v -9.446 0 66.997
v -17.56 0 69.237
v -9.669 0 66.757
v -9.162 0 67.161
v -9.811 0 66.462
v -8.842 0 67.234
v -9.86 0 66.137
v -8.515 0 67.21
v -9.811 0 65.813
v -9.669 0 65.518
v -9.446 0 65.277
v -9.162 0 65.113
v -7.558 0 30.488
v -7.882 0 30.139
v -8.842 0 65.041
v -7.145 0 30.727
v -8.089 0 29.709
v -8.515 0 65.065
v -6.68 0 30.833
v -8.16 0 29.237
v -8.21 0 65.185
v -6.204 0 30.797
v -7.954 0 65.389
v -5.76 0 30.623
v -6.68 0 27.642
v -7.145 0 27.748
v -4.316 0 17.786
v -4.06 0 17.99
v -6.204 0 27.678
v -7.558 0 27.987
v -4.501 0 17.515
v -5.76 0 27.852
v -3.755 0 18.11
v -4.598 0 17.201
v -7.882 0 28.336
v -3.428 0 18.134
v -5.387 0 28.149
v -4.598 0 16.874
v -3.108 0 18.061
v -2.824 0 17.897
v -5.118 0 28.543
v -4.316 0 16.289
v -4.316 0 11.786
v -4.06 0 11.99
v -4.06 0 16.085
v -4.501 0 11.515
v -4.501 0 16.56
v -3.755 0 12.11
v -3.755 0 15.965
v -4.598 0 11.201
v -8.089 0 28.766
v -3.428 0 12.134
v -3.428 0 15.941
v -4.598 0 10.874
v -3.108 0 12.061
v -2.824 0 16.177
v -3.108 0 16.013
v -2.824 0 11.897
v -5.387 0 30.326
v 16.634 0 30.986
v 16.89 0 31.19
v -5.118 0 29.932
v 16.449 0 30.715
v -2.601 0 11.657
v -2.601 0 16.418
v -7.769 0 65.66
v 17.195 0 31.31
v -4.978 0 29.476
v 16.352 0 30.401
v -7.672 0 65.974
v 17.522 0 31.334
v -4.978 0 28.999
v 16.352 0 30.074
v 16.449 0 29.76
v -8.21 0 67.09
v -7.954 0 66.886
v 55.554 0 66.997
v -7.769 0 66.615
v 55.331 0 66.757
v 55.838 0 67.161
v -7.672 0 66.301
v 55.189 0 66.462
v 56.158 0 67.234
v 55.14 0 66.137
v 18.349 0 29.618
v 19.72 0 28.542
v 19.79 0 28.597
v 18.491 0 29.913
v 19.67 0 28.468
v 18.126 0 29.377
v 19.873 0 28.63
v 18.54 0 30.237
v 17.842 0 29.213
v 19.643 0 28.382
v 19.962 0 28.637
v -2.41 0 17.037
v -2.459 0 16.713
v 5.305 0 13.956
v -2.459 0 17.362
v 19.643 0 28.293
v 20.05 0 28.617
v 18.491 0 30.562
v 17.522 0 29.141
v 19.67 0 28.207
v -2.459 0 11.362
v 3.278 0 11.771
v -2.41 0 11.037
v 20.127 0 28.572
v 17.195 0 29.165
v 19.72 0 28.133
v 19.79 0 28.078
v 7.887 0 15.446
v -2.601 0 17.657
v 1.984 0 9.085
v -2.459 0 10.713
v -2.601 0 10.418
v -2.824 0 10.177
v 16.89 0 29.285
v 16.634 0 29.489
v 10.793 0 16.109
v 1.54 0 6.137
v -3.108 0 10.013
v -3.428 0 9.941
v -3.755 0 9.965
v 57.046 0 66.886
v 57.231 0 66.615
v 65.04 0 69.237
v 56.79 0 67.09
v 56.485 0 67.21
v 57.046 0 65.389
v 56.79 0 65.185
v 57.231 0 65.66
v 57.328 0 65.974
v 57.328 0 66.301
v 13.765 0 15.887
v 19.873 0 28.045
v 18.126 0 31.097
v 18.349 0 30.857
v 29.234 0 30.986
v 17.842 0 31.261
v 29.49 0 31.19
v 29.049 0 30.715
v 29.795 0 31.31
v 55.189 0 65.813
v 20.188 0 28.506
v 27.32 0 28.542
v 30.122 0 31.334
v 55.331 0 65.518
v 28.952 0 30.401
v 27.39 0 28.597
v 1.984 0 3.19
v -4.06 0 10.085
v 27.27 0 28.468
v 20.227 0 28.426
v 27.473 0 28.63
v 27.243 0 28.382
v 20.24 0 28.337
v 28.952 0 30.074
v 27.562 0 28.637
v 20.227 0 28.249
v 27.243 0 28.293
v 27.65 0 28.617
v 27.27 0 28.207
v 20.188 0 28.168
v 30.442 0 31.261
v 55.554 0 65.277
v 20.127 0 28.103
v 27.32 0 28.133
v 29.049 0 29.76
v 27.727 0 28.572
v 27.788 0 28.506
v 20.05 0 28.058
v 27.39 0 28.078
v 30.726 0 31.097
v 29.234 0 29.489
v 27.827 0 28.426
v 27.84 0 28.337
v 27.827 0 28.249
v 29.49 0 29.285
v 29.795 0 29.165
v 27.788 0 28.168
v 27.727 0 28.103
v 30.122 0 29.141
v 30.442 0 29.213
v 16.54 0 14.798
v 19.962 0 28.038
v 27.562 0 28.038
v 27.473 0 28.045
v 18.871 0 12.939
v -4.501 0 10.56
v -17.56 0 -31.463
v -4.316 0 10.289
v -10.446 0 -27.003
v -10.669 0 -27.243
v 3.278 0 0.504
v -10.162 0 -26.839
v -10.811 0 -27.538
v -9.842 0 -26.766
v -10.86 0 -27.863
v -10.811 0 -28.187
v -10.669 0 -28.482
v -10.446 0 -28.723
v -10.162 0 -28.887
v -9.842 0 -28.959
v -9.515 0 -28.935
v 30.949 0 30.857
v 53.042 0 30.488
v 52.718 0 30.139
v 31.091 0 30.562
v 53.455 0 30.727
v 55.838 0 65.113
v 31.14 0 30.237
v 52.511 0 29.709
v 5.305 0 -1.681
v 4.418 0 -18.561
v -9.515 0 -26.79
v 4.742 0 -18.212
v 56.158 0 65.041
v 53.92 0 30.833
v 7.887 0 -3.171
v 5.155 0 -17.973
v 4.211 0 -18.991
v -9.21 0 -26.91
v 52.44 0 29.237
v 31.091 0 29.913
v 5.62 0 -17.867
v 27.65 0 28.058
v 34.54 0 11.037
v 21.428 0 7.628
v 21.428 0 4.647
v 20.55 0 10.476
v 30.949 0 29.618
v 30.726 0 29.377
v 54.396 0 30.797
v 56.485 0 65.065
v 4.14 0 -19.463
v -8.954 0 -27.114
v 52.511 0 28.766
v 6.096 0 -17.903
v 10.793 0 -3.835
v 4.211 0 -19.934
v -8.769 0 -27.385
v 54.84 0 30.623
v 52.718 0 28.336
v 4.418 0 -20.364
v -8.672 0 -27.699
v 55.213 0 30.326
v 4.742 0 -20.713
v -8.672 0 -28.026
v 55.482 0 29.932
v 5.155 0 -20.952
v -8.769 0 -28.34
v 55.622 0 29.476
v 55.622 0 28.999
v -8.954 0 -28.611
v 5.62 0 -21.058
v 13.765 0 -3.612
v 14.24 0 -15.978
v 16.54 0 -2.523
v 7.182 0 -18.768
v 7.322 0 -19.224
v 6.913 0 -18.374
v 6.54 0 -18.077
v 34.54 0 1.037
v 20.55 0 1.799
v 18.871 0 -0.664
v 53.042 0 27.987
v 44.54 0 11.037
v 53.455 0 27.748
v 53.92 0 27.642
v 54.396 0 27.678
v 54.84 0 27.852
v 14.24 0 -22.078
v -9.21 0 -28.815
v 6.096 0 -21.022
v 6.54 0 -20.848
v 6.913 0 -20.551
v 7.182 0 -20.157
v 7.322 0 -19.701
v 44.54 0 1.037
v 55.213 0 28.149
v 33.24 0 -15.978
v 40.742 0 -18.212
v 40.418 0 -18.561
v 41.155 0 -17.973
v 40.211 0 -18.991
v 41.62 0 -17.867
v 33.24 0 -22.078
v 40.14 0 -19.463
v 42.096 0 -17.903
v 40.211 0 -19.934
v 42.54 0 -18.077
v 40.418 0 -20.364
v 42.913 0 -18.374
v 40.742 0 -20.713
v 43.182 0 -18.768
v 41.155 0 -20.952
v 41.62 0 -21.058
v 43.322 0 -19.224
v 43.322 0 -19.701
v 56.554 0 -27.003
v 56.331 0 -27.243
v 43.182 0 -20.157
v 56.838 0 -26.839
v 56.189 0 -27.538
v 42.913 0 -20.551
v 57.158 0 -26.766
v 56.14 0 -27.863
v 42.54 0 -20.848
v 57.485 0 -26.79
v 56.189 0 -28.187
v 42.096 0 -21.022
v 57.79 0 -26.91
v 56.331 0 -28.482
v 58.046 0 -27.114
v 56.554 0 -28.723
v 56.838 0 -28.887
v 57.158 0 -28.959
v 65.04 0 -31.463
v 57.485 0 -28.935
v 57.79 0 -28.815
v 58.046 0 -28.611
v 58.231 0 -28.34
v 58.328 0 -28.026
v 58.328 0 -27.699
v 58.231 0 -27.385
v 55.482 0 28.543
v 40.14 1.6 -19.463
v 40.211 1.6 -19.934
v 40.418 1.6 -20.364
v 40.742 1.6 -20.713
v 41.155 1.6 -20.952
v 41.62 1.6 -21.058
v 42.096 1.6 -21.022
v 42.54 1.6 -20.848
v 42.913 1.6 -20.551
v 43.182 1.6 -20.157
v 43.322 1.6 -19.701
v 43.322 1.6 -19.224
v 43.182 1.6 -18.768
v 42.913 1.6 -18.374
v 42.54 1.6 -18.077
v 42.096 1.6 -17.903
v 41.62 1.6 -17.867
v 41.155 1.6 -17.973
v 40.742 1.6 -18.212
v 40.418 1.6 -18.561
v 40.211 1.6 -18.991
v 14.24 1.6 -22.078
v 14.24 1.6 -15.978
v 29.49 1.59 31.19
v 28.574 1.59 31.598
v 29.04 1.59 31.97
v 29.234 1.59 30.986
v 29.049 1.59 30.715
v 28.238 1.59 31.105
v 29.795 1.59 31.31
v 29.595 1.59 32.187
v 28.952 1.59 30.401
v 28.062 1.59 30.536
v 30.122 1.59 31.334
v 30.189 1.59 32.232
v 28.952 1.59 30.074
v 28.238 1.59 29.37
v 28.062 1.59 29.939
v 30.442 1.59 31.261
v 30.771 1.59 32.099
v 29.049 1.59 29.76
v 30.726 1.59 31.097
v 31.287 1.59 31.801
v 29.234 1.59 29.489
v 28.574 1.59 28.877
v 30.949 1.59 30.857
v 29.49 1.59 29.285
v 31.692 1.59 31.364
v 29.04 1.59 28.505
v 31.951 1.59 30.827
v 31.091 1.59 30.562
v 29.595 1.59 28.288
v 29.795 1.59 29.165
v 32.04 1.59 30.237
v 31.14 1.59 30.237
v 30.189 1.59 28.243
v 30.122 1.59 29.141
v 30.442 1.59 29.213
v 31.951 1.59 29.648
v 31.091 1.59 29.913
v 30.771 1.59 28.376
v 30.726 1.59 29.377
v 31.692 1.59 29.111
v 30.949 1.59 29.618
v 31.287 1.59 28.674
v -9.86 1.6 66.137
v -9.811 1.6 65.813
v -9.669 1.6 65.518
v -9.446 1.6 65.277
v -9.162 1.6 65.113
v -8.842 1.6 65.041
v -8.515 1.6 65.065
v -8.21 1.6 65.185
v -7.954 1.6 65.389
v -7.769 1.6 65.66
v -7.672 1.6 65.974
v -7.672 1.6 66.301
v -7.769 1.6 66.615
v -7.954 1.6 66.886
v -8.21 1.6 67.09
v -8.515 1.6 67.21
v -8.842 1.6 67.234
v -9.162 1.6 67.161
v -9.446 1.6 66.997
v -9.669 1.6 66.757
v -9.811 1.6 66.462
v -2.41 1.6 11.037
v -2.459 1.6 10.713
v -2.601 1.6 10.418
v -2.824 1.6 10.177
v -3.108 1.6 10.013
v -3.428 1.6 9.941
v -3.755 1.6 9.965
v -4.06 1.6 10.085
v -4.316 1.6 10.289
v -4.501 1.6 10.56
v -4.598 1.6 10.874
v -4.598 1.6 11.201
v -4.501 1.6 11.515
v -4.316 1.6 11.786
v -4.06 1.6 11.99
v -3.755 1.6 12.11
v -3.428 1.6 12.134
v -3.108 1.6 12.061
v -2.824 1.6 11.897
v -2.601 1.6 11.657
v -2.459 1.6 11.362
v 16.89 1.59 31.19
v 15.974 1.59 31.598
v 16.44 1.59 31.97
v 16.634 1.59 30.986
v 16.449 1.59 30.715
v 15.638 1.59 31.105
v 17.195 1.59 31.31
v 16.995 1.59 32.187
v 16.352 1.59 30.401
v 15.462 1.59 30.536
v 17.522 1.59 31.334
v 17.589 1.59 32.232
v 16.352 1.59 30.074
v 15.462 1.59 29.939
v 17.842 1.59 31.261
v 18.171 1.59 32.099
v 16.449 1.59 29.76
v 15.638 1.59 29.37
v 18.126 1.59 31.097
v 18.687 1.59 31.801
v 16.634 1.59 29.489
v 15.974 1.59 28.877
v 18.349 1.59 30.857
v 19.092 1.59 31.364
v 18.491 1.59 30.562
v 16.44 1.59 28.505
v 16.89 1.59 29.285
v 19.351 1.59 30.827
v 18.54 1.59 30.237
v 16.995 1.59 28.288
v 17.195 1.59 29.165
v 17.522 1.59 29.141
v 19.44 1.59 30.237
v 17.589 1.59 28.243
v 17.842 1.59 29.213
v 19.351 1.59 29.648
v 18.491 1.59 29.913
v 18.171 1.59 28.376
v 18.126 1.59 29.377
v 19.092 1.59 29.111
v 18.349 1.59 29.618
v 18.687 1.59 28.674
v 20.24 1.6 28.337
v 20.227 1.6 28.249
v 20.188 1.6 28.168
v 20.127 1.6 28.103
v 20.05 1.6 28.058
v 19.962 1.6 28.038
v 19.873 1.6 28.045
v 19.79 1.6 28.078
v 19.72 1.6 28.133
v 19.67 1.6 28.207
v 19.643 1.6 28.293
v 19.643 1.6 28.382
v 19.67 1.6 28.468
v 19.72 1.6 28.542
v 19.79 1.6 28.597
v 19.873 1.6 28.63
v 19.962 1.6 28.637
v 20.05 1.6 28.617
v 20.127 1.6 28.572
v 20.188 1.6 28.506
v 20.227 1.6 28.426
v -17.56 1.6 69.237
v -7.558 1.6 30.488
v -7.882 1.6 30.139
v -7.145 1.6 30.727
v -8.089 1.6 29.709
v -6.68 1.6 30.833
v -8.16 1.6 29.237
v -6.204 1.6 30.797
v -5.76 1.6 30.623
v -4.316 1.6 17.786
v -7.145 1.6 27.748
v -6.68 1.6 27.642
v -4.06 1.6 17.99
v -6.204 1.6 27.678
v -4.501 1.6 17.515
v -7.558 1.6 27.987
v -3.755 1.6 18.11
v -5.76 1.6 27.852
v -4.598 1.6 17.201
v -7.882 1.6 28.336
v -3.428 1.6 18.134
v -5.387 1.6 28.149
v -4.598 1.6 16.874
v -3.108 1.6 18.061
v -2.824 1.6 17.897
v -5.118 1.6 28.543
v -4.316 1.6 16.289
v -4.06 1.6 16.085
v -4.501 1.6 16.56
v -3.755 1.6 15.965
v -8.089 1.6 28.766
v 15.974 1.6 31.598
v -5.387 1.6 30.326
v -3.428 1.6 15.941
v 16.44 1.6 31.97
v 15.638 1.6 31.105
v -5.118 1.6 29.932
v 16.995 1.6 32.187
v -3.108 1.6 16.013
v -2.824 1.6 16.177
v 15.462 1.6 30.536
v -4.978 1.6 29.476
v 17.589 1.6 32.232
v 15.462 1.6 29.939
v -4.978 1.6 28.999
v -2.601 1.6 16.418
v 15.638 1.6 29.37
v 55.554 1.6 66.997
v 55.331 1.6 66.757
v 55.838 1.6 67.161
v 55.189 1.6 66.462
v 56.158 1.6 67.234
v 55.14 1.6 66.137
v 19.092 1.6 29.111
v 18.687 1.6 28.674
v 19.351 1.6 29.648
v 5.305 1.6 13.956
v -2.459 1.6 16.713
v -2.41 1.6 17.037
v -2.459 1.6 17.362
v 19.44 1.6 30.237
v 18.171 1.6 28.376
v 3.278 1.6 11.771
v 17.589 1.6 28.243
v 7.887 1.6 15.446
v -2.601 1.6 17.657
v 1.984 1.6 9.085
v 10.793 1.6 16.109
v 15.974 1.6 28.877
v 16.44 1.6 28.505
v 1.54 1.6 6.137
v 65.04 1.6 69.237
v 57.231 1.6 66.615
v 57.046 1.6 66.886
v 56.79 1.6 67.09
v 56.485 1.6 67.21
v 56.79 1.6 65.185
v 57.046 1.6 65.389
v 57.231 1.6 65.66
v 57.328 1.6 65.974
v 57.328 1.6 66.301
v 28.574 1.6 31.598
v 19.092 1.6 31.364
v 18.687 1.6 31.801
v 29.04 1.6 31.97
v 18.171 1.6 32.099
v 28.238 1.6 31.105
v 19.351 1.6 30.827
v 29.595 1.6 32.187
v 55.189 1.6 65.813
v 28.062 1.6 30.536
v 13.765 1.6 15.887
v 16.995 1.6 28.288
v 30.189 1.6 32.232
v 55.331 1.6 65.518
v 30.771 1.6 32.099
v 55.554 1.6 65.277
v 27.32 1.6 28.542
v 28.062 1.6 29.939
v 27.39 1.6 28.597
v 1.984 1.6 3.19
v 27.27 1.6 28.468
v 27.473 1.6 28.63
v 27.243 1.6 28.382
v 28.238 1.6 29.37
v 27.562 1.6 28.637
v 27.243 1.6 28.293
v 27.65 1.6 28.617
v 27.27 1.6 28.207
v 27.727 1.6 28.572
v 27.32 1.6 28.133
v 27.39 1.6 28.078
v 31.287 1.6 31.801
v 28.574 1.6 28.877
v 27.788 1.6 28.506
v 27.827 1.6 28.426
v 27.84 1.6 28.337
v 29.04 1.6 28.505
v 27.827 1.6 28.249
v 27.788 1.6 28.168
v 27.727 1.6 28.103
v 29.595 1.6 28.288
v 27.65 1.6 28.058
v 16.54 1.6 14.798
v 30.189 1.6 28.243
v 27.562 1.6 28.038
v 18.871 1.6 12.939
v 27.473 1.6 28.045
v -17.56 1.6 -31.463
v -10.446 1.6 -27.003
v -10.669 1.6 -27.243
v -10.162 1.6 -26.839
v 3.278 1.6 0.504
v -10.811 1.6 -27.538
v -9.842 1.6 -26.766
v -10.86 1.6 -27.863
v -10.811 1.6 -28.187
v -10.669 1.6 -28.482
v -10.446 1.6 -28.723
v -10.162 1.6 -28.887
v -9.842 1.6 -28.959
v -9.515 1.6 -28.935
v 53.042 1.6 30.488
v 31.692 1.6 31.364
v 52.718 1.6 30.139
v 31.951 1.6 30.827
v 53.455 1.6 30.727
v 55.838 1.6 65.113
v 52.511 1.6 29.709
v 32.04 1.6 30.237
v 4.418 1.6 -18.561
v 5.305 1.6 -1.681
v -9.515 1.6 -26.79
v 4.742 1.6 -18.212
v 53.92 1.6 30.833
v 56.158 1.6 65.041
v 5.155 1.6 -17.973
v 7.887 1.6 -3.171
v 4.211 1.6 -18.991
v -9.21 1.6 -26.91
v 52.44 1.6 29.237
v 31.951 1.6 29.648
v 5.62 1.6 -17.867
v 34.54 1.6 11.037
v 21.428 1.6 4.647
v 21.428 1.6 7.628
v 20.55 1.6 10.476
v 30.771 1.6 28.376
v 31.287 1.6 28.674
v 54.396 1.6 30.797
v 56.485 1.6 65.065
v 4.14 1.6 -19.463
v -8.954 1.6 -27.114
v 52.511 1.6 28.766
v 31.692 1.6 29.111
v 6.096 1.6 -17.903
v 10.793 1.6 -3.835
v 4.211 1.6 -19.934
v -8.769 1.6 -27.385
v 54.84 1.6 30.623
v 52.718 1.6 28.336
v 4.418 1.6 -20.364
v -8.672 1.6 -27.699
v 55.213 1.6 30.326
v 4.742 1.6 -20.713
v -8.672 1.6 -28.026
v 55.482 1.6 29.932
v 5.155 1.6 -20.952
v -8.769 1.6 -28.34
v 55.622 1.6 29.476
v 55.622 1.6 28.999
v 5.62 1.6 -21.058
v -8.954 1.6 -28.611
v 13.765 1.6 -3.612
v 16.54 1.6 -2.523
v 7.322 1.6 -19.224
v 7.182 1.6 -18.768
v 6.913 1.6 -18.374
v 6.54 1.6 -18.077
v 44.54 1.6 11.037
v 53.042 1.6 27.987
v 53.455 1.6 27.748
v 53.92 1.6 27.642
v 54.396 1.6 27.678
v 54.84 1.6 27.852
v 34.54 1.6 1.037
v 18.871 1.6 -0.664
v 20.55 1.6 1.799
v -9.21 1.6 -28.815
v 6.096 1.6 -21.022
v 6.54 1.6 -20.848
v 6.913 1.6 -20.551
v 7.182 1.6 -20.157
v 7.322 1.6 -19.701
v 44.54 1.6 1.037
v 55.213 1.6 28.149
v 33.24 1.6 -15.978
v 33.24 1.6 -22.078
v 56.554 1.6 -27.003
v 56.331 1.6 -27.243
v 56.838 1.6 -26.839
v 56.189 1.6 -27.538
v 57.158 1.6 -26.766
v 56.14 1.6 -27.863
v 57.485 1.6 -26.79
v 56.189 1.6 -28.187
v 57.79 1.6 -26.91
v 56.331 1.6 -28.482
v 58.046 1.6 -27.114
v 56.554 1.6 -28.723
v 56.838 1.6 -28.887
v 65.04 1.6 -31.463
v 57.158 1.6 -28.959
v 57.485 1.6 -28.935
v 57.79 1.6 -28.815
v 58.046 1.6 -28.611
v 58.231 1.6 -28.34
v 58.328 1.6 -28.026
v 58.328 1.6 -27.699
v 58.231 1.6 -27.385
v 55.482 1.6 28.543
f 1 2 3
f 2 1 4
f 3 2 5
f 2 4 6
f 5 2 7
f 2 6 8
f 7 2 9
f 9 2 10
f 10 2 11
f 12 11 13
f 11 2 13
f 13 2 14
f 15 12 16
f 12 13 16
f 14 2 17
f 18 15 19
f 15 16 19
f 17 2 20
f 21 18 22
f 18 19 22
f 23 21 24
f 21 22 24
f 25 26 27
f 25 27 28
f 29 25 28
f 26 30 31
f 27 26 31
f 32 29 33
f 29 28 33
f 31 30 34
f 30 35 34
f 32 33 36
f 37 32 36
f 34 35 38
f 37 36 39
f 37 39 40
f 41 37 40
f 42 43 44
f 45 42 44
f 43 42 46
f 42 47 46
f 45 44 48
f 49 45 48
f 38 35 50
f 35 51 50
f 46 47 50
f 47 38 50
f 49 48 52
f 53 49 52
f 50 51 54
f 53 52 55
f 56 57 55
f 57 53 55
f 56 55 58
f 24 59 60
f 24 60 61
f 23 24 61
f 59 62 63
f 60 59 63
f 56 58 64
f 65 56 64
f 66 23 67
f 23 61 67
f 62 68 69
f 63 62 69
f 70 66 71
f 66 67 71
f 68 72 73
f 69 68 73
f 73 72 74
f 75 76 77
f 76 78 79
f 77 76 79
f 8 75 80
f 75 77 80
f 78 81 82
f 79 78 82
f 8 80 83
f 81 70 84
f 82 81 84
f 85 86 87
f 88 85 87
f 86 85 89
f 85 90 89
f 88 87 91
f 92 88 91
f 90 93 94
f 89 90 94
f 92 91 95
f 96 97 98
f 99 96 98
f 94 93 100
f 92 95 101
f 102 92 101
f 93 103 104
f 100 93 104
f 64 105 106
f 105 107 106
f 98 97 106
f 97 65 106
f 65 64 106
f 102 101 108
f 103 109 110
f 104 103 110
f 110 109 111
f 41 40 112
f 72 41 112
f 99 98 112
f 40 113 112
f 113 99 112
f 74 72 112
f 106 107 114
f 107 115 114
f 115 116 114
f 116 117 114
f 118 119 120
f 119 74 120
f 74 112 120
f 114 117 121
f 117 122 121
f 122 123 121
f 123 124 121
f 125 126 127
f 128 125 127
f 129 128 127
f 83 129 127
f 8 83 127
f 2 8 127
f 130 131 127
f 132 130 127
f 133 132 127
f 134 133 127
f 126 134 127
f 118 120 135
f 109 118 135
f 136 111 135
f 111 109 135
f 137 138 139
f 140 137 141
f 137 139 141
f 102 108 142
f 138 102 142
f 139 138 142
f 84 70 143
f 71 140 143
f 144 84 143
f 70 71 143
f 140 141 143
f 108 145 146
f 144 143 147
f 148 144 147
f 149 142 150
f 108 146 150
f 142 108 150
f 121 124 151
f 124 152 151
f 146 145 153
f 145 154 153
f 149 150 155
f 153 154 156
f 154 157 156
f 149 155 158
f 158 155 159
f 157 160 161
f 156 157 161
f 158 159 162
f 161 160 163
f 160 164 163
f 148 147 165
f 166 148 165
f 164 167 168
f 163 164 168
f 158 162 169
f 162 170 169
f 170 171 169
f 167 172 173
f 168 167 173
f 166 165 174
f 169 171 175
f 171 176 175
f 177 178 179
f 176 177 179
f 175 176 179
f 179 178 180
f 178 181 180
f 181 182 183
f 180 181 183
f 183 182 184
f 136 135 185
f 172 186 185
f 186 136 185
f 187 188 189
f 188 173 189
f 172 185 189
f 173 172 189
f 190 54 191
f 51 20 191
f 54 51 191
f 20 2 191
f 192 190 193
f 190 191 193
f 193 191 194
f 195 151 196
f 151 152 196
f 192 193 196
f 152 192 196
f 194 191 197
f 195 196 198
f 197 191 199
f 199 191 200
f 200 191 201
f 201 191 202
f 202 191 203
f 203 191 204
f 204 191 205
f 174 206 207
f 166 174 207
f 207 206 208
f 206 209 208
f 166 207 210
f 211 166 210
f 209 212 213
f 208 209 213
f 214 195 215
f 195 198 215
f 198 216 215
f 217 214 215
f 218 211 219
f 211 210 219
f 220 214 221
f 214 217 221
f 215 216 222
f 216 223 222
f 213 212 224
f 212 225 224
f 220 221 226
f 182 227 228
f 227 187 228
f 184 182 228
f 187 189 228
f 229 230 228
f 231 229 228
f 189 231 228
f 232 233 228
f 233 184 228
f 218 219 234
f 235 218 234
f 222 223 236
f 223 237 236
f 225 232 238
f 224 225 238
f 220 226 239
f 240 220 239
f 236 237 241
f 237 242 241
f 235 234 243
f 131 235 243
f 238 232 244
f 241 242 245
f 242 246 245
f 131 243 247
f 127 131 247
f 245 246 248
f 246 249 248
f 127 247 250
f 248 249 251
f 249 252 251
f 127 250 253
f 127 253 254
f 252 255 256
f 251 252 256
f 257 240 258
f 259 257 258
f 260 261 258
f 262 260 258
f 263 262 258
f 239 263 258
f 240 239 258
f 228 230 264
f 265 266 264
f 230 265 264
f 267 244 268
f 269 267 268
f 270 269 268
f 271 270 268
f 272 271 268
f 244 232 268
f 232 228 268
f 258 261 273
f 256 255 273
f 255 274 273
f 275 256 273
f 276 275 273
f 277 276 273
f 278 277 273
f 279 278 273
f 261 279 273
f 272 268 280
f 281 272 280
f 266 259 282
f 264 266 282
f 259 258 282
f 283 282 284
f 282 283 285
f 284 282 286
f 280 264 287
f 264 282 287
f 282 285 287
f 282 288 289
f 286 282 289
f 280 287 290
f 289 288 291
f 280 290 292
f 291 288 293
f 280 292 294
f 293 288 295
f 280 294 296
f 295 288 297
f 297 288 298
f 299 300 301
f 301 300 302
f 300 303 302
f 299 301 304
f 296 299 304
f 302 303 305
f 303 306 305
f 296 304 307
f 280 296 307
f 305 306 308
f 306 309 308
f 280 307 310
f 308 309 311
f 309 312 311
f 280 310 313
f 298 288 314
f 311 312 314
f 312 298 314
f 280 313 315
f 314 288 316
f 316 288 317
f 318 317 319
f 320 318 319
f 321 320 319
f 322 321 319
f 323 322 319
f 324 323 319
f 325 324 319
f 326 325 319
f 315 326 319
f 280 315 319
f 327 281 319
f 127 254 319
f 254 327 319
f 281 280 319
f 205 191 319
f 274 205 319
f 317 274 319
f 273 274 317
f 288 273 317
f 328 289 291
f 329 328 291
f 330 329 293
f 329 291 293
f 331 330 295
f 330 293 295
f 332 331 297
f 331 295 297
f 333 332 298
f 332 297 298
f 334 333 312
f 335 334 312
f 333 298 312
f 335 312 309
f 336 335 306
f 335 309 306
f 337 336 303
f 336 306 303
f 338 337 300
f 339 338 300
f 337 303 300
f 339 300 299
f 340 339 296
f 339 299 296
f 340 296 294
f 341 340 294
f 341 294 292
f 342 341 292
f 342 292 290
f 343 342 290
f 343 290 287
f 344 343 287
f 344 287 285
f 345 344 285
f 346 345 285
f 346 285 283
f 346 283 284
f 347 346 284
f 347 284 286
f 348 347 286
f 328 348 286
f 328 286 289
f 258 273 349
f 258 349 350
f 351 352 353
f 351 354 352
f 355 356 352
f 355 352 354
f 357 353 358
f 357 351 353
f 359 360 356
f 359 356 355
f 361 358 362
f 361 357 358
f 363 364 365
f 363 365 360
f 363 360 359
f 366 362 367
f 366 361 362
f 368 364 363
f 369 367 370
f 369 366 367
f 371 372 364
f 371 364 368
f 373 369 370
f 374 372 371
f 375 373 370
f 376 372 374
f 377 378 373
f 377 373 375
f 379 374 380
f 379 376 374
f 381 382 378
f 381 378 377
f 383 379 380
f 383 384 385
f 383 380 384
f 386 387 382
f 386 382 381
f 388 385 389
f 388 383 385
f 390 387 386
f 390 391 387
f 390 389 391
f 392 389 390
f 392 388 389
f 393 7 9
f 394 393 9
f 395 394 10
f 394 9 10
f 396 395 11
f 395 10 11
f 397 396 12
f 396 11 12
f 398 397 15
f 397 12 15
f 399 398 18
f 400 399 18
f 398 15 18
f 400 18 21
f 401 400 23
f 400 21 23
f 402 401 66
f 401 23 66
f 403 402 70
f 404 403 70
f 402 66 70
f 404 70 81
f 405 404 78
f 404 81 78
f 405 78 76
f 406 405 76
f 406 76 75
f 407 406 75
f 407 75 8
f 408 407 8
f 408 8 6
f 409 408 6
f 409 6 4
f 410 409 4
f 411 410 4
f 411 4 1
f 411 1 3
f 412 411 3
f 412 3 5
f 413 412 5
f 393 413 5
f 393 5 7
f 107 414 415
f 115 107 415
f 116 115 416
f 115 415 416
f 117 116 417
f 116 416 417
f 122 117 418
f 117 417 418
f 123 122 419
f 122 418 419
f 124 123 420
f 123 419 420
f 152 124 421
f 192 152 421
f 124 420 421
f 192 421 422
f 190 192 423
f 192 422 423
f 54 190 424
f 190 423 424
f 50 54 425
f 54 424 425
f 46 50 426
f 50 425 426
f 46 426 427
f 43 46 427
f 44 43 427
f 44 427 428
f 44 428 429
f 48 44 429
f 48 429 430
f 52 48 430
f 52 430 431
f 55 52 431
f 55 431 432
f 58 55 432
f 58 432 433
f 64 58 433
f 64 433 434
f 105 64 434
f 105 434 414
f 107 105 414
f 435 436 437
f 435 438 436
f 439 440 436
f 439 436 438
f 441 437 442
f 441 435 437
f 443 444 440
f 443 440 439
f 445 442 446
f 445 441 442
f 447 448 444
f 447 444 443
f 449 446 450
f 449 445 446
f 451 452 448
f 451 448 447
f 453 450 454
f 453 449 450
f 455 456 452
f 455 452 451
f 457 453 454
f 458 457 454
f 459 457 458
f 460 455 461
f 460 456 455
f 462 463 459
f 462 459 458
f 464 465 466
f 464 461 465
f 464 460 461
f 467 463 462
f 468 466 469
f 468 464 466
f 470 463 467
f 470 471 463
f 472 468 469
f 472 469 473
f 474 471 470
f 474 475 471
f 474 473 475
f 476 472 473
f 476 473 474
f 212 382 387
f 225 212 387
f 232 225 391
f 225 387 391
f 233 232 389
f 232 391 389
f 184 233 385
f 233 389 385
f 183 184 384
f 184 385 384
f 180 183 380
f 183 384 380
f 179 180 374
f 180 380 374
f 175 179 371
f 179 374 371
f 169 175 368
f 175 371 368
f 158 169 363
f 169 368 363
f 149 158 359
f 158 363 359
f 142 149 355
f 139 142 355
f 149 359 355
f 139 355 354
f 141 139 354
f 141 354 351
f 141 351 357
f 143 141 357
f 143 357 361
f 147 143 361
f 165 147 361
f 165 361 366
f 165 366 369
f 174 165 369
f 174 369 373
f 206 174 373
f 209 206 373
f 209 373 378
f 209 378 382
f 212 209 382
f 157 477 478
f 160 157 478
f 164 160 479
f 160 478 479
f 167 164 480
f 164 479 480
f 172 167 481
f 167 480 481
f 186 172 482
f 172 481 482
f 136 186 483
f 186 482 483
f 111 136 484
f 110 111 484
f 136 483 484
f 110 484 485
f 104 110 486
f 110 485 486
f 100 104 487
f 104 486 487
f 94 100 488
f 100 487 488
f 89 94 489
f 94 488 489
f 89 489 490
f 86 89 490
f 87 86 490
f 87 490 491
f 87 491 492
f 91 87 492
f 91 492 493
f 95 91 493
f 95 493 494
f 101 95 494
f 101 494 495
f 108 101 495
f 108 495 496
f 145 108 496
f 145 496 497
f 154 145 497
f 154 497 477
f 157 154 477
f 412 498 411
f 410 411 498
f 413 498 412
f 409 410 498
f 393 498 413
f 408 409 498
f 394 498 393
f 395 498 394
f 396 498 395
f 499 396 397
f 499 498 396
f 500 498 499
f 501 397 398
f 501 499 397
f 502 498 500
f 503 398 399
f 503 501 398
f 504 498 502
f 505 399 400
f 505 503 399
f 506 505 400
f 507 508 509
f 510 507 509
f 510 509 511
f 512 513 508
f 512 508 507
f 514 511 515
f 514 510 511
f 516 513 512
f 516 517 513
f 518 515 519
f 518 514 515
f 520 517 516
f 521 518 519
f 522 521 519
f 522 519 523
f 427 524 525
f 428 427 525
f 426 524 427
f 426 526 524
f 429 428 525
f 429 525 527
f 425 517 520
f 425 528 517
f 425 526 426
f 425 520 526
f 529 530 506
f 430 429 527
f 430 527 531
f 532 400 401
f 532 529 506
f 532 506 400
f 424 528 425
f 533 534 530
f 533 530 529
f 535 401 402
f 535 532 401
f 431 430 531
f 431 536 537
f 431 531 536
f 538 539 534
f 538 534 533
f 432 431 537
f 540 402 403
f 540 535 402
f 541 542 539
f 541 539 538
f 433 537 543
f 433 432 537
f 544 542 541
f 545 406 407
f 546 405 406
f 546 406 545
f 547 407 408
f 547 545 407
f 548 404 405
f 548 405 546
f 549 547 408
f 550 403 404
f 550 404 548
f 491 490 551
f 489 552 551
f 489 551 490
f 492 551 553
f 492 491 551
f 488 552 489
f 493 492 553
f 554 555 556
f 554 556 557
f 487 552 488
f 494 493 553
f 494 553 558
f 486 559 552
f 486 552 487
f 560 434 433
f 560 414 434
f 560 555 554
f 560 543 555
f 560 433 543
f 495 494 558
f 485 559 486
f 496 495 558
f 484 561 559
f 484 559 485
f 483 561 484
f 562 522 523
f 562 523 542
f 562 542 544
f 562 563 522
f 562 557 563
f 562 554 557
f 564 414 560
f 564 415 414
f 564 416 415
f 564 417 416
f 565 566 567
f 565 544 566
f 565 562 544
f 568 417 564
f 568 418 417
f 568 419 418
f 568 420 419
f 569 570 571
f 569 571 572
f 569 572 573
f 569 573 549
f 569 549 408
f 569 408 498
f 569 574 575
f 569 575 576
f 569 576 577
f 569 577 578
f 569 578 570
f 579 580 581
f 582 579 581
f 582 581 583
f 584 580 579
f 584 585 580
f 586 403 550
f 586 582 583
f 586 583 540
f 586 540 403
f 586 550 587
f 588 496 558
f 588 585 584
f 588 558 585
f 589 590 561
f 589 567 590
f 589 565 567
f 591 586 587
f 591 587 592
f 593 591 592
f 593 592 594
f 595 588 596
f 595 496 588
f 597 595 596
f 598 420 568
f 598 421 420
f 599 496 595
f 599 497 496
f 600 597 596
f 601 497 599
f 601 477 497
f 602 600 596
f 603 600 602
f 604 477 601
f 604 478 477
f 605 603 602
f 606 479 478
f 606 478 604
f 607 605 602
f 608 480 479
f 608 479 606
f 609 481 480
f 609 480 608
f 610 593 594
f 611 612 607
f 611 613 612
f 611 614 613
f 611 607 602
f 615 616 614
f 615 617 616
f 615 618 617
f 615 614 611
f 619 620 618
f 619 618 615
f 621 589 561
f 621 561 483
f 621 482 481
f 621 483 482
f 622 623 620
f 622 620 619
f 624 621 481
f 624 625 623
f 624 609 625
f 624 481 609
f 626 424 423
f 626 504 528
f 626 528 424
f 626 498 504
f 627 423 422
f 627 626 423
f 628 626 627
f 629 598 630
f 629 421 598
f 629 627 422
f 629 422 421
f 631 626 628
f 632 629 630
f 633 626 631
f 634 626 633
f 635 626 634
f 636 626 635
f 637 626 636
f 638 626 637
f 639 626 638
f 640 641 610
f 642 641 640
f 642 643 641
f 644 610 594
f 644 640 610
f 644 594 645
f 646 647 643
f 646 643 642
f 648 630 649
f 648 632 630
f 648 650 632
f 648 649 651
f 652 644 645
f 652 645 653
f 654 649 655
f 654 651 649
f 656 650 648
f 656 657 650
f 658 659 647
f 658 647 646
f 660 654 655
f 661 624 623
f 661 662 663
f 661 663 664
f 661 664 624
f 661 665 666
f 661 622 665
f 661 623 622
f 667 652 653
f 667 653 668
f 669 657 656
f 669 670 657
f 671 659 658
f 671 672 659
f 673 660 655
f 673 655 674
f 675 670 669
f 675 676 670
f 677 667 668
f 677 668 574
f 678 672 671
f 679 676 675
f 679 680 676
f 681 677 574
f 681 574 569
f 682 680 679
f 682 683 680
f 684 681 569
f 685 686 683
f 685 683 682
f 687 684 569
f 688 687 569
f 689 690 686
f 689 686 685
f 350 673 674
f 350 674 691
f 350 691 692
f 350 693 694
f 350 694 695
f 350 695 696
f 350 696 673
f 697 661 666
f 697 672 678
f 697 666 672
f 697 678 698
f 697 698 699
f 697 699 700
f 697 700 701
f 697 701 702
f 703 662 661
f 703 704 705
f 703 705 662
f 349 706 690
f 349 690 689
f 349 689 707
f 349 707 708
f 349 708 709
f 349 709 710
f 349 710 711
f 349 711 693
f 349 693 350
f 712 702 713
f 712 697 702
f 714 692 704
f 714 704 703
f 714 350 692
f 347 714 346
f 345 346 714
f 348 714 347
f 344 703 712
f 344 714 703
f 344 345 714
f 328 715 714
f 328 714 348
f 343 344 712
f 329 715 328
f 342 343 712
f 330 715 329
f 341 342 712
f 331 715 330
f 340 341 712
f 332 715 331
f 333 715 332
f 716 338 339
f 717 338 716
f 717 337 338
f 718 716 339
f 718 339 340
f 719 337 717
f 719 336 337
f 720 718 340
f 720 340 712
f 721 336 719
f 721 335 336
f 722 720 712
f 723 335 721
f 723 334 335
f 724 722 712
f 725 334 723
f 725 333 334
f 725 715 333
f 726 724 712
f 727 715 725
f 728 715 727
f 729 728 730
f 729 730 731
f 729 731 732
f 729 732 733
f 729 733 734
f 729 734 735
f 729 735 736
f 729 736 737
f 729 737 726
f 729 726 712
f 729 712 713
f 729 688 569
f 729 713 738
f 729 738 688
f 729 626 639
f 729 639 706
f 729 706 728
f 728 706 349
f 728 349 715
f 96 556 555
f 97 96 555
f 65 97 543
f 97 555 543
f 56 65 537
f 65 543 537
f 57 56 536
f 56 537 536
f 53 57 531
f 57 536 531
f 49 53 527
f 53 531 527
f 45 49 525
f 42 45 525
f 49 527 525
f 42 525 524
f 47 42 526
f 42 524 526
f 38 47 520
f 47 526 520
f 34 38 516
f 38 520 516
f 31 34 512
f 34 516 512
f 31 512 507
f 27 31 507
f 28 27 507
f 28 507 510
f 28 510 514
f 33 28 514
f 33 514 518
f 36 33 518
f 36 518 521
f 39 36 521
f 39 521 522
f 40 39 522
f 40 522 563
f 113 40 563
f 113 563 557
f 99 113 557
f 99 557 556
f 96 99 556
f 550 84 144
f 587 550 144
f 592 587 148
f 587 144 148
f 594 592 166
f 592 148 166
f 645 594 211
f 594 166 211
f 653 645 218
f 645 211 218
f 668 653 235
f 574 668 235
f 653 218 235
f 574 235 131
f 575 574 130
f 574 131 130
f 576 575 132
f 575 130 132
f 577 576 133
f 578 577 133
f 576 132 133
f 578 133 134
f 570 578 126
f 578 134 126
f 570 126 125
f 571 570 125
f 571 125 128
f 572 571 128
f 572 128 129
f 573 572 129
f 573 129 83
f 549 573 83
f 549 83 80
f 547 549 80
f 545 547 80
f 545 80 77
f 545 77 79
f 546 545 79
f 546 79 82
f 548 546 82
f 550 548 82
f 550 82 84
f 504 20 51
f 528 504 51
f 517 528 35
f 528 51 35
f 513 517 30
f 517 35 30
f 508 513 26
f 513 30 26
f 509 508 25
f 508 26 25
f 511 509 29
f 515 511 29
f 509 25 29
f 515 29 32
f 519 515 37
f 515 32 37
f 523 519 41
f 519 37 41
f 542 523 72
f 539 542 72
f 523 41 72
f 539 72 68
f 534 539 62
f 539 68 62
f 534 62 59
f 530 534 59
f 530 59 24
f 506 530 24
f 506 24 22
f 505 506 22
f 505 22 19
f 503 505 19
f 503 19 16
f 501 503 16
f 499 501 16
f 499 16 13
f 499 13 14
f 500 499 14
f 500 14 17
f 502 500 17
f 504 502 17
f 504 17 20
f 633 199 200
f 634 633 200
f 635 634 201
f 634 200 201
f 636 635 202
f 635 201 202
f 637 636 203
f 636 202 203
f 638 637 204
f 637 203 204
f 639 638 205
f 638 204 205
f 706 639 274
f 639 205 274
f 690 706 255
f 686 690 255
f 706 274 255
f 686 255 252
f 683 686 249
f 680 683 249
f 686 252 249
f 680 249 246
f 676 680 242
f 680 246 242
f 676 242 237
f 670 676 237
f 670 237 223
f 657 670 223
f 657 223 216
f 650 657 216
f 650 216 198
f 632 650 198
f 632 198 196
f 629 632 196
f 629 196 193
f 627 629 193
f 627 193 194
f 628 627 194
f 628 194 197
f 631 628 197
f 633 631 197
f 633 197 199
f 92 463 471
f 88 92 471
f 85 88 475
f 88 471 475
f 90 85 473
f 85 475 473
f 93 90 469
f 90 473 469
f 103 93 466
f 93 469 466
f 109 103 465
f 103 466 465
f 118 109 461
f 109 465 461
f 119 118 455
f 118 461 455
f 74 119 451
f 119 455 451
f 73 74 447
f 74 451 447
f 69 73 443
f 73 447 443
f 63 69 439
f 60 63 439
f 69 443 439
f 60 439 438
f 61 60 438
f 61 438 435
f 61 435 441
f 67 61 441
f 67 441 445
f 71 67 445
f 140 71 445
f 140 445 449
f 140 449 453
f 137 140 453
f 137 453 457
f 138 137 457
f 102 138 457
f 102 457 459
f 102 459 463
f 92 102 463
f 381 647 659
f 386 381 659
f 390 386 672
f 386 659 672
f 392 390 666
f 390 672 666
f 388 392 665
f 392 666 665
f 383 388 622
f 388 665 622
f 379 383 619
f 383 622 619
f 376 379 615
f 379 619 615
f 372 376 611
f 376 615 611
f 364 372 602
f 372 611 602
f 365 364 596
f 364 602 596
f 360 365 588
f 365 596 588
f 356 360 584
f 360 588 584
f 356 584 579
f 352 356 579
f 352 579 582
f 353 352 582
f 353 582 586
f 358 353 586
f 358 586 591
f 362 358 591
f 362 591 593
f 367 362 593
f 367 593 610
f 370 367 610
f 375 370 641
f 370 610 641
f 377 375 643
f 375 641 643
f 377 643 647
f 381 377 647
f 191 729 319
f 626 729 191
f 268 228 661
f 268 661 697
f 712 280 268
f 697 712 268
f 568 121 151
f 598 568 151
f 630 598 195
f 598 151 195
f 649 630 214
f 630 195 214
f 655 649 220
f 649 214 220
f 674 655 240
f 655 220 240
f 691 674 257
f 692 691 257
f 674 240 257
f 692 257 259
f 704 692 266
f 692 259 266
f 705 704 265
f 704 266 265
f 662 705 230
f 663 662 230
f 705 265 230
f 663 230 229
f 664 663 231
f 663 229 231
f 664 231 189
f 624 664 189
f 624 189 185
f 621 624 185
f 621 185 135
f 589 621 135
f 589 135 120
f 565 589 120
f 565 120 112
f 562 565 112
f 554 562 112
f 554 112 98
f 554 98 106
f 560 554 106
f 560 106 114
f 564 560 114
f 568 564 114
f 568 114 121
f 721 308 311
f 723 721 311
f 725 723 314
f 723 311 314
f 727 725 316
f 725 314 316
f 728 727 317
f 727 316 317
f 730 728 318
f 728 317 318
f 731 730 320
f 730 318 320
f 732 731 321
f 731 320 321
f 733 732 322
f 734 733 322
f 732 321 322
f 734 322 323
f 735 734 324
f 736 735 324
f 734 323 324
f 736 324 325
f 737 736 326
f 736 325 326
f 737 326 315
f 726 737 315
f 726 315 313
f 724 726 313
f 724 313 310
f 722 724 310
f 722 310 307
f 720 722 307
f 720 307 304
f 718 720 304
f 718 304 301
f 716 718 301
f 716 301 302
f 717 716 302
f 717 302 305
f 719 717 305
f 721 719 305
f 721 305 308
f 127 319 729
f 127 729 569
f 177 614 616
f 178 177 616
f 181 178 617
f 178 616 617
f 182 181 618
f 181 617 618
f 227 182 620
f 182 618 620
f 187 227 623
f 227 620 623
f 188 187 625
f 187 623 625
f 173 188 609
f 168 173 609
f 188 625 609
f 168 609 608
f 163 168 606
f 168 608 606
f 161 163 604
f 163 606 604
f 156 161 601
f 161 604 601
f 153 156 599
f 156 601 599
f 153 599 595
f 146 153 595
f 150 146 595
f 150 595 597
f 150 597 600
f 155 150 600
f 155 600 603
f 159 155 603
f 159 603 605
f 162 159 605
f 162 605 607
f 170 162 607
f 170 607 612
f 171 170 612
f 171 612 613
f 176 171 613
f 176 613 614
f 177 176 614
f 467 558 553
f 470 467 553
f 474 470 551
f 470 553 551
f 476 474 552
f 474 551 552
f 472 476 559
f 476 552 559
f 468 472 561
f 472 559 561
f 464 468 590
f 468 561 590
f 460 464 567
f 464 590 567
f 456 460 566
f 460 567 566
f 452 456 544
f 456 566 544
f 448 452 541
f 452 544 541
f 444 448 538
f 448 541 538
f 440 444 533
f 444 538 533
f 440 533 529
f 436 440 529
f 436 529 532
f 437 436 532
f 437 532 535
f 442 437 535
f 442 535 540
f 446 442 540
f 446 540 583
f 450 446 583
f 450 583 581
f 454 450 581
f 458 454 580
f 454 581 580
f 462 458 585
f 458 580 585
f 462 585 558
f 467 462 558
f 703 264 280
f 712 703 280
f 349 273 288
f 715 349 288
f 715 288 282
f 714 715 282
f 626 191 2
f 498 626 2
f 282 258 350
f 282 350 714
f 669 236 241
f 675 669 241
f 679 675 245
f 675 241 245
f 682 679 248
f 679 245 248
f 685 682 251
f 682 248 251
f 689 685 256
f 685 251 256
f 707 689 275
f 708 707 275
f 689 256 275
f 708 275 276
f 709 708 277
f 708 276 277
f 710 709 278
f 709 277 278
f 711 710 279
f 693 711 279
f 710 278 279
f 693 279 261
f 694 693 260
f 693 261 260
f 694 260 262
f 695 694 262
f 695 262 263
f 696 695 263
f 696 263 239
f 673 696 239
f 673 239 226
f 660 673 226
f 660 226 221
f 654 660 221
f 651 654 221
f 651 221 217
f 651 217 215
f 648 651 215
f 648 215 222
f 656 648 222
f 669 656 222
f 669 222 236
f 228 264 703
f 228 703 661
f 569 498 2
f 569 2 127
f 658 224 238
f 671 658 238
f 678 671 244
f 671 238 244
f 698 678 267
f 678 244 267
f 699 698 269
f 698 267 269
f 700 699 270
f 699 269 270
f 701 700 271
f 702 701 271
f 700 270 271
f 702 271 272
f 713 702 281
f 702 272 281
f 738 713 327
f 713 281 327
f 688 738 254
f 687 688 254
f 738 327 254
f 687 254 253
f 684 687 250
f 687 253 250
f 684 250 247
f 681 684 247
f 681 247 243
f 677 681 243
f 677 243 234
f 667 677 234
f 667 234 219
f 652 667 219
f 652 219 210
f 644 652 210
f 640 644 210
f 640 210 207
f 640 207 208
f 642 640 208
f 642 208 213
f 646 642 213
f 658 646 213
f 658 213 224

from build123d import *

# Parameters (mm, degrees)
BOSS_EXTRUDE1_DEPTH            = 1.6
F_2_2_2_2_DIAMETER_HOLE1_D     = 2.2
F_2_2_2_2_DIAMETER_HOLE1_DEPTH = 5
SKETCH9_R                      = 10
CUT_EXTRUDE4_DEPTH             = 2.6
SKETCH15_W                     = 83
SKETCH15_H                     = 2.5
CUT_EXTRUDE8_DEPTH             = 2.6
SKETCH37_W                     = 83
SKETCH37_H                     = 1.6
EXTRUDE1_DEPTH                 = 1.6
SKETCH38_W                     = 83
SKETCH38_H                     = 1.6
EXTRUDE2_DEPTH                 = 1.6
F_2_2_2_2_DIAMETER_HOLE4_D     = 2.2
F_2_2_2_2_DIAMETER_HOLE4_DEPTH = 1.6
SKETCH49_W                     = 0.2
SKETCH49_H                     = 100.7
EXTRUDE5_DEPTH                 = 2.6
SKETCH51_W                     = 10
SKETCH51_H                     = 10
CUT_EXTRUDE9_DEPTH             = 10
SKETCH52_W                     = 19
SKETCH52_H                     = 6.1
CUT_EXTRUDE10_DEPTH            = 2.6
SKETCH_2_R                     = 1.6
CUT_EXTRUDE_2_DEPTH            = 10
SKETCH_8_R                     = 0.3
CUT_EXTRUDE_3_DEPTH            = 10
SKETCH_9_R                     = 1.1
CUT_EXTRUDE_4_DEPTH            = 10
SKETCH_10_R                    = 2
CUT_EXTRUDE_5_DEPTH            = 0.01
SKETCH_11_R                    = 1.1
CUT_EXTRUDE_6_DEPTH            = 10


with BuildPart() as part:
    # Sketch1 → Boss-Extrude1 (new body)
    with BuildSketch(Plane(origin=(0, 0, 0), x_dir=(1, 0, 0), z_dir=(0, 1, 0))):
        Polygon((65.24, 0.272495156), (65.24, -46.437452638), (65.24, -63.637452638), (65.24, -70.137452638), (-17.76, -70.137452638), (-17.76, -63.637452638), (-17.76, -48.637452638), (-17.76, -45.78978272), (-17.76, 4.362547362), (-17.76, 21.562547362), (-17.76, 29.862547362), (65.24, 29.862547362), (65.24, 21.562547362), (65.24, 6.562547362), align=None)
    extrude(amount=BOSS_EXTRUDE1_DEPTH)

    # Ø2.2 (2.2) Diameter Hole1
    with Locations(Plane(origin=(0, 1.6, 0), x_dir=(1, 0, 0), z_dir=(0, 1, 0))):
        with Locations((57.24, 27.862547362), (-9.76, 27.862547362)):
            Hole(F_2_2_2_2_DIAMETER_HOLE1_D / 2, depth=F_2_2_2_2_DIAMETER_HOLE1_DEPTH)

    # Sketch9 → Cut-Extrude4 (cut, through all)
    with BuildSketch(Plane(origin=(0, 0, 0), x_dir=(-1, 0, 0), z_dir=(0, -1, 0))):
        with Locations((-11.54, -6.137452638)):
            Circle(SKETCH9_R)
    extrude(amount=-CUT_EXTRUDE4_DEPTH, mode=Mode.SUBTRACT)

    # Sketch15 → Cut-Extrude8 (cut, through all)
    with BuildSketch(Plane.XZ):
        with Locations((23.74, 68.887452638)):
            Rectangle(SKETCH15_W, SKETCH15_H)
    extrude(amount=-CUT_EXTRUDE8_DEPTH, mode=Mode.SUBTRACT)

    # Sketch37 → Extrude1 (add)
    with BuildSketch(Plane(origin=(0, 0, -29.862547362), x_dir=(-1, 0, 0), z_dir=(0, 0, -1))):
        with Locations((-23.74, 0.8)):
            Rectangle(SKETCH37_W, SKETCH37_H)
    extrude(amount=EXTRUDE1_DEPTH)

    # Sketch38 → Extrude2 (add)
    with BuildSketch(Plane.XY.offset(67.637452638)):
        with Locations((23.74, 0.8)):
            Rectangle(SKETCH38_W, SKETCH38_H)
    extrude(amount=EXTRUDE2_DEPTH)

    # Ø2.2 (2.2) Diameter Hole4
    with Locations(Plane(origin=(0, 1.6, 0), x_dir=(1, 0, 0), z_dir=(0, 1, 0))):
        with Locations((-8.76, -66.137452638), (56.24, -66.137452638)):
            Hole(F_2_2_2_2_DIAMETER_HOLE4_D / 2, depth=F_2_2_2_2_DIAMETER_HOLE4_DEPTH)

    # Sketch49 → Extrude5 (cut, through all)
    with BuildSketch(Plane.XZ):
        with Locations((65.14, 18.887452638)):
            Rectangle(SKETCH49_W, SKETCH49_H)
        with Locations((-17.66, 18.887452638)):
            Rectangle(SKETCH49_W, SKETCH49_H)
    extrude(amount=-EXTRUDE5_DEPTH, mode=Mode.SUBTRACT)

    # Sketch51 → Cut-Extrude9 (cut)
    with BuildSketch(Plane.XZ):
        with Locations((39.54, 6.037452638)):
            Rectangle(SKETCH51_W, SKETCH51_H)
    extrude(amount=-CUT_EXTRUDE9_DEPTH, mode=Mode.SUBTRACT)

    # Sketch52 → Cut-Extrude10 (cut, through all)
    with BuildSketch(Plane.XZ):
        with Locations((23.74, -19.027547362)):
            Rectangle(SKETCH52_W, SKETCH52_H)
    extrude(amount=-CUT_EXTRUDE10_DEPTH, mode=Mode.SUBTRACT)

    # ｽｹｯﾁ2 → ｶｯﾄ - 押し出し2 (cut)
    with BuildSketch(Plane(origin=(0, 0, 0), x_dir=(-1, 0, 0), z_dir=(0, -1, 0))):
        with Locations((-54.04, -29.237452638)):
            Circle(SKETCH_2_R)
        with Locations((6.56, -29.237452638)):
            Circle(SKETCH_2_R)
        with Locations((-41.74, 19.462547362)):
            Circle(SKETCH_2_R)
        with Locations((-5.74, 19.462547362)):
            Circle(SKETCH_2_R)
    extrude(amount=-CUT_EXTRUDE_2_DEPTH, mode=Mode.SUBTRACT)

    # ｽｹｯﾁ8 → ｶｯﾄ - 押し出し3 (cut)
    with BuildSketch(Plane(origin=(0, 1.6, 0), x_dir=(1, 0, 0), z_dir=(0, 1, 0))):
        with Locations((27.54, -28.337452638)):
            Circle(SKETCH_8_R)
        with Locations((19.94, -28.337452638)):
            Circle(SKETCH_8_R)
    extrude(amount=-CUT_EXTRUDE_3_DEPTH, mode=Mode.SUBTRACT)

    # ｽｹｯﾁ9 → ｶｯﾄ - 押し出し4 (cut)
    with BuildSketch(Plane(origin=(0, 1.6, 0), x_dir=(1, 0, 0), z_dir=(0, 1, 0))):
        with Locations((30.04, -30.237452638)):
            Circle(SKETCH_9_R)
        with Locations((17.44, -30.237452638)):
            Circle(SKETCH_9_R)
    extrude(amount=-CUT_EXTRUDE_4_DEPTH, mode=Mode.SUBTRACT)

    # ｽｹｯﾁ10 → ｶｯﾄ - 押し出し5 (cut)
    with BuildSketch(Plane(origin=(0, 1.6, 0), x_dir=(1, 0, 0), z_dir=(0, 1, 0))):
        with Locations((30.04, -30.237452638)):
            Circle(SKETCH_10_R)
        with Locations((17.44, -30.237452638)):
            Circle(SKETCH_10_R)
    extrude(amount=-CUT_EXTRUDE_5_DEPTH, mode=Mode.SUBTRACT)

    # ｽｹｯﾁ11 → ｶｯﾄ - 押し出し6 (cut)
    with BuildSketch(Plane(origin=(0, 1.6, 0), x_dir=(1, 0, 0), z_dir=(0, 1, 0))):
        with Locations((-3.51, -11.037452638)):
            Circle(SKETCH_11_R)
        with Locations((-3.51, -17.037452638)):
            Circle(SKETCH_11_R)
    extrude(amount=-CUT_EXTRUDE_6_DEPTH, mode=Mode.SUBTRACT)


solid = part.part
